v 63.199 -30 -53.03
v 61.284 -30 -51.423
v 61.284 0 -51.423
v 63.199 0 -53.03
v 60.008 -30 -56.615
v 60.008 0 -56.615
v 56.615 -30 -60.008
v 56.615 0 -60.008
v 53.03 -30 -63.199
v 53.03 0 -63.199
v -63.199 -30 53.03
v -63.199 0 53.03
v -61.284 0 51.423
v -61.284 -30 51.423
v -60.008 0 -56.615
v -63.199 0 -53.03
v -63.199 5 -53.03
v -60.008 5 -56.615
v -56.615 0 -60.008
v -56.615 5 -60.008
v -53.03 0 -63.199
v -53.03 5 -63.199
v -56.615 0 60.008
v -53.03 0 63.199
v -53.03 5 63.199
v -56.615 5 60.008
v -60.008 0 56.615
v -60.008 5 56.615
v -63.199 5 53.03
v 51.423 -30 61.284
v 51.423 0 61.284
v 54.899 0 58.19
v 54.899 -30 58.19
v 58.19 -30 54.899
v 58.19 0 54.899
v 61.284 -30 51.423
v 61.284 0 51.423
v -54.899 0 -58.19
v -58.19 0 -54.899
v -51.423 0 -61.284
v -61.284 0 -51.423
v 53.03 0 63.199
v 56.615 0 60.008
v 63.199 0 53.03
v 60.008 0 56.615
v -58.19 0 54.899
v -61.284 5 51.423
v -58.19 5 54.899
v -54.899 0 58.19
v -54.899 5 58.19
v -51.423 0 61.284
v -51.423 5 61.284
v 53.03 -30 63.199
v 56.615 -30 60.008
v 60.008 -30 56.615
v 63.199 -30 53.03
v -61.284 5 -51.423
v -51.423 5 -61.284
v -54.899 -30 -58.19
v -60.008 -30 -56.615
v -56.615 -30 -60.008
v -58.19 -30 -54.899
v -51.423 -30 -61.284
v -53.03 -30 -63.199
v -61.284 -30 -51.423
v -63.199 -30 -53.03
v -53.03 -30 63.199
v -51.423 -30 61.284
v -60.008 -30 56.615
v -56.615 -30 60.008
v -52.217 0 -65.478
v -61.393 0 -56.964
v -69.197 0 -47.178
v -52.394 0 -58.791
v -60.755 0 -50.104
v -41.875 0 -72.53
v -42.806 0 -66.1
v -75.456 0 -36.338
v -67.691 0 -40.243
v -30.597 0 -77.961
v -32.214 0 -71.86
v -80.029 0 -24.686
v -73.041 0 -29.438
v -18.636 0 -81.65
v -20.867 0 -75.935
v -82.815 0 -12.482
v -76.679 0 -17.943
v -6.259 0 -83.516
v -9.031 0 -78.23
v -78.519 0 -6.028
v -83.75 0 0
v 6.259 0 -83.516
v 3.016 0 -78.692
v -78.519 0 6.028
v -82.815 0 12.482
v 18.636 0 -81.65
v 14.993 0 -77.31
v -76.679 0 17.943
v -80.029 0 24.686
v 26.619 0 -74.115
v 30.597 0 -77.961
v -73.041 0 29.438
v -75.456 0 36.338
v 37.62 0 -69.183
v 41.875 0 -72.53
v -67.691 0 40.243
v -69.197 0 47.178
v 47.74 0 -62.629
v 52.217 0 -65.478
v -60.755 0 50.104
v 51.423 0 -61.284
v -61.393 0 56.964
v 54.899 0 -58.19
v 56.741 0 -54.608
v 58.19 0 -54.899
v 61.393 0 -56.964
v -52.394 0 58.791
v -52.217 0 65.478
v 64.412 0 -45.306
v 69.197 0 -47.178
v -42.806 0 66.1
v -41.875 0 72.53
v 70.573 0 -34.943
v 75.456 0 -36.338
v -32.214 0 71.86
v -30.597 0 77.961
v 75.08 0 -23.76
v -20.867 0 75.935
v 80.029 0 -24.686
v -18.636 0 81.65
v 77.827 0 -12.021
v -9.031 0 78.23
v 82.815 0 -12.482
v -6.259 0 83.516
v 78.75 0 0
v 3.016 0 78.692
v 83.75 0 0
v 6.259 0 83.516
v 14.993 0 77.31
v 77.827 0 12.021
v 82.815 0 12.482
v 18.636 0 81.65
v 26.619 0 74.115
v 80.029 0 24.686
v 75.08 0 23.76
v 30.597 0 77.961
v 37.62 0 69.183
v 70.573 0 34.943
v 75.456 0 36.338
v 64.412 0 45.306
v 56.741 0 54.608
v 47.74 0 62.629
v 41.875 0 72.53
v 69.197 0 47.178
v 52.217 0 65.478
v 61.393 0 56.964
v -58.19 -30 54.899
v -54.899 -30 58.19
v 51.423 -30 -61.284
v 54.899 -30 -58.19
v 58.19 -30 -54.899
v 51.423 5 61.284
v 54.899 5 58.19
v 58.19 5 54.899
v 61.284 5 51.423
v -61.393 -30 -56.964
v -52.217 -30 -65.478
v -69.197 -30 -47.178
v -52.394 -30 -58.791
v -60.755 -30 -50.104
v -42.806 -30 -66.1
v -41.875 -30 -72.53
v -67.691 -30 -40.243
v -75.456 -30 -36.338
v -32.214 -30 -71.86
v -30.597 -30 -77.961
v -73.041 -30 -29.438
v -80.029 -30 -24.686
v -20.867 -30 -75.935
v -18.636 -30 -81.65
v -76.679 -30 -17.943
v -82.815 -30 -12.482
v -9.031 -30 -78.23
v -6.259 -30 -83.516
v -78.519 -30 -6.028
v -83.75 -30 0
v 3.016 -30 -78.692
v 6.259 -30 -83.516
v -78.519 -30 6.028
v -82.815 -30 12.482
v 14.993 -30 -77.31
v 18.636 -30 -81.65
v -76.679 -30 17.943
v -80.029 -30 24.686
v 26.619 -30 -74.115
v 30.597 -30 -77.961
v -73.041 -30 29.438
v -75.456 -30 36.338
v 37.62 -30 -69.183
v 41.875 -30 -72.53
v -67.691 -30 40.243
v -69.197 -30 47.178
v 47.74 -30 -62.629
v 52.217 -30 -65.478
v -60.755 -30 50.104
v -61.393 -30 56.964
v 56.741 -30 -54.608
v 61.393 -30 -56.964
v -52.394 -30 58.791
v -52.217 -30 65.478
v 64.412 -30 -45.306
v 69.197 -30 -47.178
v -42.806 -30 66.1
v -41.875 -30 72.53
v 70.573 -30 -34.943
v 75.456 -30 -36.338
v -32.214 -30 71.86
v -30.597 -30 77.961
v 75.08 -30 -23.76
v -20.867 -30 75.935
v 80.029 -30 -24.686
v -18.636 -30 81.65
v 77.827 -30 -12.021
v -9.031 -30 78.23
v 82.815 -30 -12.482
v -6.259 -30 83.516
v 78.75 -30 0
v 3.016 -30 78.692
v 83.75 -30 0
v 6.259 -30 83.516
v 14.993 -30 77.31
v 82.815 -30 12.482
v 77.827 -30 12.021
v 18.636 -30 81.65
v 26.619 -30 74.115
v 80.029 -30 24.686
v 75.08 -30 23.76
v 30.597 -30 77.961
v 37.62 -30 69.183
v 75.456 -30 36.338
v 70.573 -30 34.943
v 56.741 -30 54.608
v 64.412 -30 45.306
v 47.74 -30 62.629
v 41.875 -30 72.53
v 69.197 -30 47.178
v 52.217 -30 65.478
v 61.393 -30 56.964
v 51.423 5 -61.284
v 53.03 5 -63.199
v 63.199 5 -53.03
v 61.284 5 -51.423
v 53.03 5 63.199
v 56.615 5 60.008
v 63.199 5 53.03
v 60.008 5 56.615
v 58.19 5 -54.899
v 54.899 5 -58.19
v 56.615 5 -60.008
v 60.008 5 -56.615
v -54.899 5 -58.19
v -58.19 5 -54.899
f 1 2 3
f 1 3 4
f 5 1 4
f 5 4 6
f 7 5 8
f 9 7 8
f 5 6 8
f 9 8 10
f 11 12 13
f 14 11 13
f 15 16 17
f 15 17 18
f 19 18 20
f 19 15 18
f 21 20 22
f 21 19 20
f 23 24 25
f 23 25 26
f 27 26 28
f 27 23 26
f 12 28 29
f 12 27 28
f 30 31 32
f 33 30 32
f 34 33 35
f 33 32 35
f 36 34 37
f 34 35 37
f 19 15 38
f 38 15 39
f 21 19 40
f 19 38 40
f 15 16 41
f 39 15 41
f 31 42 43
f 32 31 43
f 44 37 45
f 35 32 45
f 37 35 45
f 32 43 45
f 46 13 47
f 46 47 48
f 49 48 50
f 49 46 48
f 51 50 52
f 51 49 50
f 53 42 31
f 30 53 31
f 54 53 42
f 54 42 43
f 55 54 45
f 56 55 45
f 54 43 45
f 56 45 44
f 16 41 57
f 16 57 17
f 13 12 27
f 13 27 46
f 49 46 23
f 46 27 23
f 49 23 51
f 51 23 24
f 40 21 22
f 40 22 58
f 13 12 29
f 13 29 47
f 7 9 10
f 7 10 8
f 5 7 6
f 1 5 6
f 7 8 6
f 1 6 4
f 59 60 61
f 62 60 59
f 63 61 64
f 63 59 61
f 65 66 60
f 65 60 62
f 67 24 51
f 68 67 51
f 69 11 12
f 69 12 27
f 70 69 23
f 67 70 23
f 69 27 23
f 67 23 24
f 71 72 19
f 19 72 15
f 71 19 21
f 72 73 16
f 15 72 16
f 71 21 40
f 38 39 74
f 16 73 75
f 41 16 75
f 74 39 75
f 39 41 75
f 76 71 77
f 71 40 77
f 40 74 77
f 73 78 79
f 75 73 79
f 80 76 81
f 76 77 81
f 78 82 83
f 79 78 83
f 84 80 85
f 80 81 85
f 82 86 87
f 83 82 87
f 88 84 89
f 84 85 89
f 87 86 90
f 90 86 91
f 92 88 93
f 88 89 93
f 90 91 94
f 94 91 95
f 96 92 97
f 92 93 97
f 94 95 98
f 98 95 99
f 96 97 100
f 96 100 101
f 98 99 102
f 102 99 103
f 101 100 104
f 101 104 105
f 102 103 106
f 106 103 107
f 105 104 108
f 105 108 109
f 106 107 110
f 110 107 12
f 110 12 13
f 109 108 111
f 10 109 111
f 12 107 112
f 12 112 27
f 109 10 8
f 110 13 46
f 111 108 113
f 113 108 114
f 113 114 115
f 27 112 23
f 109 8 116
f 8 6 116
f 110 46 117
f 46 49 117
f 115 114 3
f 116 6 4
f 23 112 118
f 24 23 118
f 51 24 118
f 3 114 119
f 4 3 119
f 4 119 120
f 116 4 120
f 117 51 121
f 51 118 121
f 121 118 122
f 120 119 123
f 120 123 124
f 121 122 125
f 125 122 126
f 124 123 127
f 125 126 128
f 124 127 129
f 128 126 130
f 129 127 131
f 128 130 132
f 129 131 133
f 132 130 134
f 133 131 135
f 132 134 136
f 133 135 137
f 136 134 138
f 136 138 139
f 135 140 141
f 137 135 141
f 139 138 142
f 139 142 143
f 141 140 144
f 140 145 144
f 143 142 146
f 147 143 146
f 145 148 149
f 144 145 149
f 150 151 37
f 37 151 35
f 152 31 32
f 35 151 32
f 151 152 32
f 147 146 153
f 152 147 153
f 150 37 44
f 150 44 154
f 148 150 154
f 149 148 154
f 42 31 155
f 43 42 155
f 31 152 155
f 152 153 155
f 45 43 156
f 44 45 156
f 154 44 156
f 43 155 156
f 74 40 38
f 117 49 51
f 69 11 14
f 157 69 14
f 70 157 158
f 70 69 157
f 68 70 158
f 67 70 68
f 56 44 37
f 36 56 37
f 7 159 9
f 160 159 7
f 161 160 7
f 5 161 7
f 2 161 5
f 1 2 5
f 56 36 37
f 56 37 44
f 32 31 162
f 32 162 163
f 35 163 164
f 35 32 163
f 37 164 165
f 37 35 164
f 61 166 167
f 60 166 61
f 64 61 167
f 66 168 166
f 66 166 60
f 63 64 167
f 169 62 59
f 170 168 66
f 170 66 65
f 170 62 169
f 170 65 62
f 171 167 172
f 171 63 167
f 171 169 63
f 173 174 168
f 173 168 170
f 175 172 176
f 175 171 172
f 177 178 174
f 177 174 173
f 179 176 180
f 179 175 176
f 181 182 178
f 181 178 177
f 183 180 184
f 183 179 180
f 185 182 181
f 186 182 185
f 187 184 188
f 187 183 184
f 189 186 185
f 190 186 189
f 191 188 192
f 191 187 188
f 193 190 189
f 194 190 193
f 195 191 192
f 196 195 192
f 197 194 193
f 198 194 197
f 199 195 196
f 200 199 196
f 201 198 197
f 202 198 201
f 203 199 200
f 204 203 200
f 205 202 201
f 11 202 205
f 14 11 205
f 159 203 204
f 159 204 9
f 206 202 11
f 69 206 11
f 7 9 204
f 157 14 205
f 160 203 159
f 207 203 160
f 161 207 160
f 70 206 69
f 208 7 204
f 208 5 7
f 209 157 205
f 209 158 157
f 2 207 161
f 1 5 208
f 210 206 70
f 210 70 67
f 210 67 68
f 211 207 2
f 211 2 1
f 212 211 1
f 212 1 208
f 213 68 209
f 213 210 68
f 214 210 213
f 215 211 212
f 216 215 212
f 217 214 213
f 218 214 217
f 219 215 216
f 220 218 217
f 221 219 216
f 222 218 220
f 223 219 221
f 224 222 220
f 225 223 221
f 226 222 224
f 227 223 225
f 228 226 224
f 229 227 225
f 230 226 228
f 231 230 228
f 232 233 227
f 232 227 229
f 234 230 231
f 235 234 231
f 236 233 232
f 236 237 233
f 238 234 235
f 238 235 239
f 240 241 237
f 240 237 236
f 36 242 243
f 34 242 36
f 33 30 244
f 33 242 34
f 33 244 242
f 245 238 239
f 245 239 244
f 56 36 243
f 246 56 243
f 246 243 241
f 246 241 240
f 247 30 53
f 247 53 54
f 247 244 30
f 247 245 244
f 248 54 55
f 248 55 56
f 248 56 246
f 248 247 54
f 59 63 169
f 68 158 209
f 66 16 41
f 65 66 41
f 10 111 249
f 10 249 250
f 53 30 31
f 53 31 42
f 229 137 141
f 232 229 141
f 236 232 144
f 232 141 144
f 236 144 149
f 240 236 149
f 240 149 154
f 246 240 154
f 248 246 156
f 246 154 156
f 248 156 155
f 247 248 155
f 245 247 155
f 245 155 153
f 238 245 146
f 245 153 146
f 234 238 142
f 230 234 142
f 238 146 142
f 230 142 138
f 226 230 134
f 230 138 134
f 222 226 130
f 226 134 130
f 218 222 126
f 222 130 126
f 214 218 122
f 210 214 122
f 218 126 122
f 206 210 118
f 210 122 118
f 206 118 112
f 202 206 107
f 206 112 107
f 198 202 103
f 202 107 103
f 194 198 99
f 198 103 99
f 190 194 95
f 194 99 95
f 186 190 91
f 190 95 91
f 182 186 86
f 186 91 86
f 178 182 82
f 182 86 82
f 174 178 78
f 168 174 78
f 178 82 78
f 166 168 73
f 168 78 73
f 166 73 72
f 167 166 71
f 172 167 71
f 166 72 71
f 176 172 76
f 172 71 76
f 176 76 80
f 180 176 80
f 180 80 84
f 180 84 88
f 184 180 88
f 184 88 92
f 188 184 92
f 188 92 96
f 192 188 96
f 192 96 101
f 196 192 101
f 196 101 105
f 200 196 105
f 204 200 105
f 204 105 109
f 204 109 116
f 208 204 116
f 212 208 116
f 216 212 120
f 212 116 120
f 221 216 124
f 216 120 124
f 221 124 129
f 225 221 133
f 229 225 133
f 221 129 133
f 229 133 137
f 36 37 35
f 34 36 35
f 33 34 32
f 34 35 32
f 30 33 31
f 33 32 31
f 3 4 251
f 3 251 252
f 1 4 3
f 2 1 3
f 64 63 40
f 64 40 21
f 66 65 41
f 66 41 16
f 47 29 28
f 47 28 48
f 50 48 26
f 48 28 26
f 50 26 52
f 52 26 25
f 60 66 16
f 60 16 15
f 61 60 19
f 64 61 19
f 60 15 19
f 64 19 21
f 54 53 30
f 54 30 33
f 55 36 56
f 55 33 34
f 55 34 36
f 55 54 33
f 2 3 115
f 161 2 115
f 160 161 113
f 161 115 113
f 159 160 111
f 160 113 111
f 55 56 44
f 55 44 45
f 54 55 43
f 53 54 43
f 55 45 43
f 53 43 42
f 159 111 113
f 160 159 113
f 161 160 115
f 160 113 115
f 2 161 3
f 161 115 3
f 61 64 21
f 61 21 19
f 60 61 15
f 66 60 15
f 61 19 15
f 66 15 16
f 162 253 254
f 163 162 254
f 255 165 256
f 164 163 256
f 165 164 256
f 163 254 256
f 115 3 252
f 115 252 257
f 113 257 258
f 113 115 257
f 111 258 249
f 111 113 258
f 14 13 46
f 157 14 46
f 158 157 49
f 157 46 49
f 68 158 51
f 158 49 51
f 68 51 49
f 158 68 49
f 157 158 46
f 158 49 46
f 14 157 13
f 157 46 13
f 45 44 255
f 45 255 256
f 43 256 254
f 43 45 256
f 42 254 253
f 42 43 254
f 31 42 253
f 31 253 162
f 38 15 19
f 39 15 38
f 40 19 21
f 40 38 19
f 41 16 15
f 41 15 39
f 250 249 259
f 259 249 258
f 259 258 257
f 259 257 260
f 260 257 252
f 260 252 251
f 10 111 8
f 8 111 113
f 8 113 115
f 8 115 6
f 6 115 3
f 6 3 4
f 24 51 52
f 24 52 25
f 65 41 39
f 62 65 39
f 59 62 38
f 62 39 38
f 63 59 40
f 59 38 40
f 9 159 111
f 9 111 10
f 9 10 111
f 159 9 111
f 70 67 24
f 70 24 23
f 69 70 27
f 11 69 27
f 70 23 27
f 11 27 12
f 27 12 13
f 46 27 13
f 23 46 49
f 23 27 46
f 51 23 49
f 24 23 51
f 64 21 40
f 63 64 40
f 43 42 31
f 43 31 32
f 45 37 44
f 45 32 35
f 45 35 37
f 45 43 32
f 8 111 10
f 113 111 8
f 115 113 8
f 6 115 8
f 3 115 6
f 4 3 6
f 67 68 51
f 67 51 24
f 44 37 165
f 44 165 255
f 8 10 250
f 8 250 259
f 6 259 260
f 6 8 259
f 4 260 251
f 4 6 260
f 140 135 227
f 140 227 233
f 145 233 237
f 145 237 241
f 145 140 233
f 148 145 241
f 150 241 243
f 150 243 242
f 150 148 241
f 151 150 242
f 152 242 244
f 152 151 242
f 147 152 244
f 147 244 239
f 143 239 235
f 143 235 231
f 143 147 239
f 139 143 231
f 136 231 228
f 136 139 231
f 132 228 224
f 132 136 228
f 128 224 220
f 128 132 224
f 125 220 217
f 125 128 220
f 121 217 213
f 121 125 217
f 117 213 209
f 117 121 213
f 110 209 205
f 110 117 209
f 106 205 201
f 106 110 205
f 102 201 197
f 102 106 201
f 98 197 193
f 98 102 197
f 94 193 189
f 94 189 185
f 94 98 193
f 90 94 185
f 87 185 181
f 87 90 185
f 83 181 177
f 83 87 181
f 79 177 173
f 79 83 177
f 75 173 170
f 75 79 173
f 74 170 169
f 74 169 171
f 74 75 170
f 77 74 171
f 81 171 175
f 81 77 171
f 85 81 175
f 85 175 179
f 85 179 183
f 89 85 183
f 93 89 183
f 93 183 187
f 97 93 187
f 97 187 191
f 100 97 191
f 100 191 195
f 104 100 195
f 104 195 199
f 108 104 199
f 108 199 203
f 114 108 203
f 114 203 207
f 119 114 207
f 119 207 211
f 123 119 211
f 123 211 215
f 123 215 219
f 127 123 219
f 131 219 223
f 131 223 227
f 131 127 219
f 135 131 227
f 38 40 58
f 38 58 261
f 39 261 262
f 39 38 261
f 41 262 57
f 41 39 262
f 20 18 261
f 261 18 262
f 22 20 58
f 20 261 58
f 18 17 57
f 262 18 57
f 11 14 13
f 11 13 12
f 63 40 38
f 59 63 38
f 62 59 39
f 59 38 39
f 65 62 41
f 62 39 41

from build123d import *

# Parameters (mm, degrees)
F0_R     = 83.75
F0_R_2   = 78.75
F1_DEPTH = 30
F2_DEPTH = 5
F3_DEPTH = 30


with BuildPart() as f1:
    # F0 (on Front) → F1 (new body)
    with BuildSketch(Plane.XZ):
        Circle(F0_R)
        with BuildLine():
            ThreePointArc((-53.029978, -63.198667), (-58.336309, -58.336309), (-63.198667, -53.029978))
            Line((-63.198667, -53.029978), (-61.283555, -51.423009))
            ThreePointArc((-61.283555, -51.423009), (-56.568542, -56.568542), (-51.423009, -61.283555))
            Line((-51.423009, -61.283555), (-53.029978, -63.198667))
        make_face(mode=Mode.SUBTRACT)
        with BuildLine():
            Line((53.029978, -63.198667), (51.423009, -61.283555))
            ThreePointArc((51.423009, -61.283555), (56.568542, -56.568542), (61.283555, -51.423009))
            Line((61.283555, -51.423009), (63.198667, -53.029978))
            ThreePointArc((63.198667, -53.029978), (58.336309, -58.336309), (53.029978, -63.198667))
        make_face(mode=Mode.SUBTRACT)
        with BuildLine():
            ThreePointArc((-63.198667, 53.029978), (-58.336309, 58.336309), (-53.029978, 63.198667))
            Line((-53.029978, 63.198667), (-51.423009, 61.283555))
            ThreePointArc((-51.423009, 61.283555), (-56.568542, 56.568542), (-61.283555, 51.423009))
            Line((-61.283555, 51.423009), (-63.198667, 53.029978))
        make_face(mode=Mode.SUBTRACT)
        Circle(F0_R_2, mode=Mode.SUBTRACT)
        with BuildLine():
            ThreePointArc((53.029978, 63.198667), (58.336309, 58.336309), (63.198667, 53.029978))
            Line((63.198667, 53.029978), (61.283555, 51.423009))
            ThreePointArc((61.283555, 51.423009), (56.568542, 56.568542), (51.423009, 61.283555))
            Line((51.423009, 61.283555), (53.029978, 63.198667))
        make_face(mode=Mode.SUBTRACT)
    extrude(amount=F1_DEPTH)


with BuildPart() as f2:
    # F0 (on Front) → F2 (new body)
    with BuildSketch(Plane.XZ):
        with BuildLine():
            Line((-51.423009, 61.283555), (-53.029978, 63.198667))
            ThreePointArc((-53.029978, 63.198667), (-58.336309, 58.336309), (-63.198667, 53.029978))
            Line((-63.198667, 53.029978), (-61.283555, 51.423009))
            ThreePointArc((-61.283555, 51.423009), (-56.568542, 56.568542), (-51.423009, 61.283555))
        make_face()
        with BuildLine():
            Line((-61.283555, -51.423009), (-63.198667, -53.029978))
            ThreePointArc((-63.198667, -53.029978), (-58.336309, -58.336309), (-53.029978, -63.198667))
            Line((-53.029978, -63.198667), (-51.423009, -61.283555))
            ThreePointArc((-51.423009, -61.283555), (-56.568542, -56.568542), (-61.283555, -51.423009))
        make_face()
        with BuildLine():
            Line((61.283555, 51.423009), (63.198667, 53.029978))
            ThreePointArc((63.198667, 53.029978), (58.336309, 58.336309), (53.029978, 63.198667))
            Line((53.029978, 63.198667), (51.423009, 61.283555))
            ThreePointArc((51.423009, 61.283555), (56.568542, 56.568542), (61.283555, 51.423009))
        make_face()
        with BuildLine():
            ThreePointArc((61.283555, -51.423009), (56.568542, -56.568542), (51.423009, -61.283555))
            Line((51.423009, -61.283555), (53.029978, -63.198667))
            ThreePointArc((53.029978, -63.198667), (58.336309, -58.336309), (63.198667, -53.029978))
            Line((63.198667, -53.029978), (61.283555, -51.423009))
        make_face()
    extrude(amount=-F2_DEPTH)


with BuildPart() as f3:
    # F0 (on Front) → F3 (new body)
    with BuildSketch(Plane.XZ):
        with BuildLine():
            Line((-51.423009, 61.283555), (-53.029978, 63.198667))
            ThreePointArc((-53.029978, 63.198667), (-58.336309, 58.336309), (-63.198667, 53.029978))
            Line((-63.198667, 53.029978), (-61.283555, 51.423009))
            ThreePointArc((-61.283555, 51.423009), (-56.568542, 56.568542), (-51.423009, 61.283555))
        make_face()
        with BuildLine():
            Line((-61.283555, -51.423009), (-63.198667, -53.029978))
            ThreePointArc((-63.198667, -53.029978), (-58.336309, -58.336309), (-53.029978, -63.198667))
            Line((-53.029978, -63.198667), (-51.423009, -61.283555))
            ThreePointArc((-51.423009, -61.283555), (-56.568542, -56.568542), (-61.283555, -51.423009))
        make_face()
        with BuildLine():
            ThreePointArc((61.283555, -51.423009), (56.568542, -56.568542), (51.423009, -61.283555))
            Line((51.423009, -61.283555), (53.029978, -63.198667))
            ThreePointArc((53.029978, -63.198667), (58.336309, -58.336309), (63.198667, -53.029978))
            Line((63.198667, -53.029978), (61.283555, -51.423009))
        make_face()
        with BuildLine():
            Line((61.283555, 51.423009), (63.198667, 53.029978))
            ThreePointArc((63.198667, 53.029978), (58.336309, 58.336309), (53.029978, 63.198667))
            Line((53.029978, 63.198667), (51.423009, 61.283555))
            ThreePointArc((51.423009, 61.283555), (56.568542, 56.568542), (61.283555, 51.423009))
        make_face()
    extrude(amount=F3_DEPTH)


solid = Compound([f1.part, f2.part, f3.part])
